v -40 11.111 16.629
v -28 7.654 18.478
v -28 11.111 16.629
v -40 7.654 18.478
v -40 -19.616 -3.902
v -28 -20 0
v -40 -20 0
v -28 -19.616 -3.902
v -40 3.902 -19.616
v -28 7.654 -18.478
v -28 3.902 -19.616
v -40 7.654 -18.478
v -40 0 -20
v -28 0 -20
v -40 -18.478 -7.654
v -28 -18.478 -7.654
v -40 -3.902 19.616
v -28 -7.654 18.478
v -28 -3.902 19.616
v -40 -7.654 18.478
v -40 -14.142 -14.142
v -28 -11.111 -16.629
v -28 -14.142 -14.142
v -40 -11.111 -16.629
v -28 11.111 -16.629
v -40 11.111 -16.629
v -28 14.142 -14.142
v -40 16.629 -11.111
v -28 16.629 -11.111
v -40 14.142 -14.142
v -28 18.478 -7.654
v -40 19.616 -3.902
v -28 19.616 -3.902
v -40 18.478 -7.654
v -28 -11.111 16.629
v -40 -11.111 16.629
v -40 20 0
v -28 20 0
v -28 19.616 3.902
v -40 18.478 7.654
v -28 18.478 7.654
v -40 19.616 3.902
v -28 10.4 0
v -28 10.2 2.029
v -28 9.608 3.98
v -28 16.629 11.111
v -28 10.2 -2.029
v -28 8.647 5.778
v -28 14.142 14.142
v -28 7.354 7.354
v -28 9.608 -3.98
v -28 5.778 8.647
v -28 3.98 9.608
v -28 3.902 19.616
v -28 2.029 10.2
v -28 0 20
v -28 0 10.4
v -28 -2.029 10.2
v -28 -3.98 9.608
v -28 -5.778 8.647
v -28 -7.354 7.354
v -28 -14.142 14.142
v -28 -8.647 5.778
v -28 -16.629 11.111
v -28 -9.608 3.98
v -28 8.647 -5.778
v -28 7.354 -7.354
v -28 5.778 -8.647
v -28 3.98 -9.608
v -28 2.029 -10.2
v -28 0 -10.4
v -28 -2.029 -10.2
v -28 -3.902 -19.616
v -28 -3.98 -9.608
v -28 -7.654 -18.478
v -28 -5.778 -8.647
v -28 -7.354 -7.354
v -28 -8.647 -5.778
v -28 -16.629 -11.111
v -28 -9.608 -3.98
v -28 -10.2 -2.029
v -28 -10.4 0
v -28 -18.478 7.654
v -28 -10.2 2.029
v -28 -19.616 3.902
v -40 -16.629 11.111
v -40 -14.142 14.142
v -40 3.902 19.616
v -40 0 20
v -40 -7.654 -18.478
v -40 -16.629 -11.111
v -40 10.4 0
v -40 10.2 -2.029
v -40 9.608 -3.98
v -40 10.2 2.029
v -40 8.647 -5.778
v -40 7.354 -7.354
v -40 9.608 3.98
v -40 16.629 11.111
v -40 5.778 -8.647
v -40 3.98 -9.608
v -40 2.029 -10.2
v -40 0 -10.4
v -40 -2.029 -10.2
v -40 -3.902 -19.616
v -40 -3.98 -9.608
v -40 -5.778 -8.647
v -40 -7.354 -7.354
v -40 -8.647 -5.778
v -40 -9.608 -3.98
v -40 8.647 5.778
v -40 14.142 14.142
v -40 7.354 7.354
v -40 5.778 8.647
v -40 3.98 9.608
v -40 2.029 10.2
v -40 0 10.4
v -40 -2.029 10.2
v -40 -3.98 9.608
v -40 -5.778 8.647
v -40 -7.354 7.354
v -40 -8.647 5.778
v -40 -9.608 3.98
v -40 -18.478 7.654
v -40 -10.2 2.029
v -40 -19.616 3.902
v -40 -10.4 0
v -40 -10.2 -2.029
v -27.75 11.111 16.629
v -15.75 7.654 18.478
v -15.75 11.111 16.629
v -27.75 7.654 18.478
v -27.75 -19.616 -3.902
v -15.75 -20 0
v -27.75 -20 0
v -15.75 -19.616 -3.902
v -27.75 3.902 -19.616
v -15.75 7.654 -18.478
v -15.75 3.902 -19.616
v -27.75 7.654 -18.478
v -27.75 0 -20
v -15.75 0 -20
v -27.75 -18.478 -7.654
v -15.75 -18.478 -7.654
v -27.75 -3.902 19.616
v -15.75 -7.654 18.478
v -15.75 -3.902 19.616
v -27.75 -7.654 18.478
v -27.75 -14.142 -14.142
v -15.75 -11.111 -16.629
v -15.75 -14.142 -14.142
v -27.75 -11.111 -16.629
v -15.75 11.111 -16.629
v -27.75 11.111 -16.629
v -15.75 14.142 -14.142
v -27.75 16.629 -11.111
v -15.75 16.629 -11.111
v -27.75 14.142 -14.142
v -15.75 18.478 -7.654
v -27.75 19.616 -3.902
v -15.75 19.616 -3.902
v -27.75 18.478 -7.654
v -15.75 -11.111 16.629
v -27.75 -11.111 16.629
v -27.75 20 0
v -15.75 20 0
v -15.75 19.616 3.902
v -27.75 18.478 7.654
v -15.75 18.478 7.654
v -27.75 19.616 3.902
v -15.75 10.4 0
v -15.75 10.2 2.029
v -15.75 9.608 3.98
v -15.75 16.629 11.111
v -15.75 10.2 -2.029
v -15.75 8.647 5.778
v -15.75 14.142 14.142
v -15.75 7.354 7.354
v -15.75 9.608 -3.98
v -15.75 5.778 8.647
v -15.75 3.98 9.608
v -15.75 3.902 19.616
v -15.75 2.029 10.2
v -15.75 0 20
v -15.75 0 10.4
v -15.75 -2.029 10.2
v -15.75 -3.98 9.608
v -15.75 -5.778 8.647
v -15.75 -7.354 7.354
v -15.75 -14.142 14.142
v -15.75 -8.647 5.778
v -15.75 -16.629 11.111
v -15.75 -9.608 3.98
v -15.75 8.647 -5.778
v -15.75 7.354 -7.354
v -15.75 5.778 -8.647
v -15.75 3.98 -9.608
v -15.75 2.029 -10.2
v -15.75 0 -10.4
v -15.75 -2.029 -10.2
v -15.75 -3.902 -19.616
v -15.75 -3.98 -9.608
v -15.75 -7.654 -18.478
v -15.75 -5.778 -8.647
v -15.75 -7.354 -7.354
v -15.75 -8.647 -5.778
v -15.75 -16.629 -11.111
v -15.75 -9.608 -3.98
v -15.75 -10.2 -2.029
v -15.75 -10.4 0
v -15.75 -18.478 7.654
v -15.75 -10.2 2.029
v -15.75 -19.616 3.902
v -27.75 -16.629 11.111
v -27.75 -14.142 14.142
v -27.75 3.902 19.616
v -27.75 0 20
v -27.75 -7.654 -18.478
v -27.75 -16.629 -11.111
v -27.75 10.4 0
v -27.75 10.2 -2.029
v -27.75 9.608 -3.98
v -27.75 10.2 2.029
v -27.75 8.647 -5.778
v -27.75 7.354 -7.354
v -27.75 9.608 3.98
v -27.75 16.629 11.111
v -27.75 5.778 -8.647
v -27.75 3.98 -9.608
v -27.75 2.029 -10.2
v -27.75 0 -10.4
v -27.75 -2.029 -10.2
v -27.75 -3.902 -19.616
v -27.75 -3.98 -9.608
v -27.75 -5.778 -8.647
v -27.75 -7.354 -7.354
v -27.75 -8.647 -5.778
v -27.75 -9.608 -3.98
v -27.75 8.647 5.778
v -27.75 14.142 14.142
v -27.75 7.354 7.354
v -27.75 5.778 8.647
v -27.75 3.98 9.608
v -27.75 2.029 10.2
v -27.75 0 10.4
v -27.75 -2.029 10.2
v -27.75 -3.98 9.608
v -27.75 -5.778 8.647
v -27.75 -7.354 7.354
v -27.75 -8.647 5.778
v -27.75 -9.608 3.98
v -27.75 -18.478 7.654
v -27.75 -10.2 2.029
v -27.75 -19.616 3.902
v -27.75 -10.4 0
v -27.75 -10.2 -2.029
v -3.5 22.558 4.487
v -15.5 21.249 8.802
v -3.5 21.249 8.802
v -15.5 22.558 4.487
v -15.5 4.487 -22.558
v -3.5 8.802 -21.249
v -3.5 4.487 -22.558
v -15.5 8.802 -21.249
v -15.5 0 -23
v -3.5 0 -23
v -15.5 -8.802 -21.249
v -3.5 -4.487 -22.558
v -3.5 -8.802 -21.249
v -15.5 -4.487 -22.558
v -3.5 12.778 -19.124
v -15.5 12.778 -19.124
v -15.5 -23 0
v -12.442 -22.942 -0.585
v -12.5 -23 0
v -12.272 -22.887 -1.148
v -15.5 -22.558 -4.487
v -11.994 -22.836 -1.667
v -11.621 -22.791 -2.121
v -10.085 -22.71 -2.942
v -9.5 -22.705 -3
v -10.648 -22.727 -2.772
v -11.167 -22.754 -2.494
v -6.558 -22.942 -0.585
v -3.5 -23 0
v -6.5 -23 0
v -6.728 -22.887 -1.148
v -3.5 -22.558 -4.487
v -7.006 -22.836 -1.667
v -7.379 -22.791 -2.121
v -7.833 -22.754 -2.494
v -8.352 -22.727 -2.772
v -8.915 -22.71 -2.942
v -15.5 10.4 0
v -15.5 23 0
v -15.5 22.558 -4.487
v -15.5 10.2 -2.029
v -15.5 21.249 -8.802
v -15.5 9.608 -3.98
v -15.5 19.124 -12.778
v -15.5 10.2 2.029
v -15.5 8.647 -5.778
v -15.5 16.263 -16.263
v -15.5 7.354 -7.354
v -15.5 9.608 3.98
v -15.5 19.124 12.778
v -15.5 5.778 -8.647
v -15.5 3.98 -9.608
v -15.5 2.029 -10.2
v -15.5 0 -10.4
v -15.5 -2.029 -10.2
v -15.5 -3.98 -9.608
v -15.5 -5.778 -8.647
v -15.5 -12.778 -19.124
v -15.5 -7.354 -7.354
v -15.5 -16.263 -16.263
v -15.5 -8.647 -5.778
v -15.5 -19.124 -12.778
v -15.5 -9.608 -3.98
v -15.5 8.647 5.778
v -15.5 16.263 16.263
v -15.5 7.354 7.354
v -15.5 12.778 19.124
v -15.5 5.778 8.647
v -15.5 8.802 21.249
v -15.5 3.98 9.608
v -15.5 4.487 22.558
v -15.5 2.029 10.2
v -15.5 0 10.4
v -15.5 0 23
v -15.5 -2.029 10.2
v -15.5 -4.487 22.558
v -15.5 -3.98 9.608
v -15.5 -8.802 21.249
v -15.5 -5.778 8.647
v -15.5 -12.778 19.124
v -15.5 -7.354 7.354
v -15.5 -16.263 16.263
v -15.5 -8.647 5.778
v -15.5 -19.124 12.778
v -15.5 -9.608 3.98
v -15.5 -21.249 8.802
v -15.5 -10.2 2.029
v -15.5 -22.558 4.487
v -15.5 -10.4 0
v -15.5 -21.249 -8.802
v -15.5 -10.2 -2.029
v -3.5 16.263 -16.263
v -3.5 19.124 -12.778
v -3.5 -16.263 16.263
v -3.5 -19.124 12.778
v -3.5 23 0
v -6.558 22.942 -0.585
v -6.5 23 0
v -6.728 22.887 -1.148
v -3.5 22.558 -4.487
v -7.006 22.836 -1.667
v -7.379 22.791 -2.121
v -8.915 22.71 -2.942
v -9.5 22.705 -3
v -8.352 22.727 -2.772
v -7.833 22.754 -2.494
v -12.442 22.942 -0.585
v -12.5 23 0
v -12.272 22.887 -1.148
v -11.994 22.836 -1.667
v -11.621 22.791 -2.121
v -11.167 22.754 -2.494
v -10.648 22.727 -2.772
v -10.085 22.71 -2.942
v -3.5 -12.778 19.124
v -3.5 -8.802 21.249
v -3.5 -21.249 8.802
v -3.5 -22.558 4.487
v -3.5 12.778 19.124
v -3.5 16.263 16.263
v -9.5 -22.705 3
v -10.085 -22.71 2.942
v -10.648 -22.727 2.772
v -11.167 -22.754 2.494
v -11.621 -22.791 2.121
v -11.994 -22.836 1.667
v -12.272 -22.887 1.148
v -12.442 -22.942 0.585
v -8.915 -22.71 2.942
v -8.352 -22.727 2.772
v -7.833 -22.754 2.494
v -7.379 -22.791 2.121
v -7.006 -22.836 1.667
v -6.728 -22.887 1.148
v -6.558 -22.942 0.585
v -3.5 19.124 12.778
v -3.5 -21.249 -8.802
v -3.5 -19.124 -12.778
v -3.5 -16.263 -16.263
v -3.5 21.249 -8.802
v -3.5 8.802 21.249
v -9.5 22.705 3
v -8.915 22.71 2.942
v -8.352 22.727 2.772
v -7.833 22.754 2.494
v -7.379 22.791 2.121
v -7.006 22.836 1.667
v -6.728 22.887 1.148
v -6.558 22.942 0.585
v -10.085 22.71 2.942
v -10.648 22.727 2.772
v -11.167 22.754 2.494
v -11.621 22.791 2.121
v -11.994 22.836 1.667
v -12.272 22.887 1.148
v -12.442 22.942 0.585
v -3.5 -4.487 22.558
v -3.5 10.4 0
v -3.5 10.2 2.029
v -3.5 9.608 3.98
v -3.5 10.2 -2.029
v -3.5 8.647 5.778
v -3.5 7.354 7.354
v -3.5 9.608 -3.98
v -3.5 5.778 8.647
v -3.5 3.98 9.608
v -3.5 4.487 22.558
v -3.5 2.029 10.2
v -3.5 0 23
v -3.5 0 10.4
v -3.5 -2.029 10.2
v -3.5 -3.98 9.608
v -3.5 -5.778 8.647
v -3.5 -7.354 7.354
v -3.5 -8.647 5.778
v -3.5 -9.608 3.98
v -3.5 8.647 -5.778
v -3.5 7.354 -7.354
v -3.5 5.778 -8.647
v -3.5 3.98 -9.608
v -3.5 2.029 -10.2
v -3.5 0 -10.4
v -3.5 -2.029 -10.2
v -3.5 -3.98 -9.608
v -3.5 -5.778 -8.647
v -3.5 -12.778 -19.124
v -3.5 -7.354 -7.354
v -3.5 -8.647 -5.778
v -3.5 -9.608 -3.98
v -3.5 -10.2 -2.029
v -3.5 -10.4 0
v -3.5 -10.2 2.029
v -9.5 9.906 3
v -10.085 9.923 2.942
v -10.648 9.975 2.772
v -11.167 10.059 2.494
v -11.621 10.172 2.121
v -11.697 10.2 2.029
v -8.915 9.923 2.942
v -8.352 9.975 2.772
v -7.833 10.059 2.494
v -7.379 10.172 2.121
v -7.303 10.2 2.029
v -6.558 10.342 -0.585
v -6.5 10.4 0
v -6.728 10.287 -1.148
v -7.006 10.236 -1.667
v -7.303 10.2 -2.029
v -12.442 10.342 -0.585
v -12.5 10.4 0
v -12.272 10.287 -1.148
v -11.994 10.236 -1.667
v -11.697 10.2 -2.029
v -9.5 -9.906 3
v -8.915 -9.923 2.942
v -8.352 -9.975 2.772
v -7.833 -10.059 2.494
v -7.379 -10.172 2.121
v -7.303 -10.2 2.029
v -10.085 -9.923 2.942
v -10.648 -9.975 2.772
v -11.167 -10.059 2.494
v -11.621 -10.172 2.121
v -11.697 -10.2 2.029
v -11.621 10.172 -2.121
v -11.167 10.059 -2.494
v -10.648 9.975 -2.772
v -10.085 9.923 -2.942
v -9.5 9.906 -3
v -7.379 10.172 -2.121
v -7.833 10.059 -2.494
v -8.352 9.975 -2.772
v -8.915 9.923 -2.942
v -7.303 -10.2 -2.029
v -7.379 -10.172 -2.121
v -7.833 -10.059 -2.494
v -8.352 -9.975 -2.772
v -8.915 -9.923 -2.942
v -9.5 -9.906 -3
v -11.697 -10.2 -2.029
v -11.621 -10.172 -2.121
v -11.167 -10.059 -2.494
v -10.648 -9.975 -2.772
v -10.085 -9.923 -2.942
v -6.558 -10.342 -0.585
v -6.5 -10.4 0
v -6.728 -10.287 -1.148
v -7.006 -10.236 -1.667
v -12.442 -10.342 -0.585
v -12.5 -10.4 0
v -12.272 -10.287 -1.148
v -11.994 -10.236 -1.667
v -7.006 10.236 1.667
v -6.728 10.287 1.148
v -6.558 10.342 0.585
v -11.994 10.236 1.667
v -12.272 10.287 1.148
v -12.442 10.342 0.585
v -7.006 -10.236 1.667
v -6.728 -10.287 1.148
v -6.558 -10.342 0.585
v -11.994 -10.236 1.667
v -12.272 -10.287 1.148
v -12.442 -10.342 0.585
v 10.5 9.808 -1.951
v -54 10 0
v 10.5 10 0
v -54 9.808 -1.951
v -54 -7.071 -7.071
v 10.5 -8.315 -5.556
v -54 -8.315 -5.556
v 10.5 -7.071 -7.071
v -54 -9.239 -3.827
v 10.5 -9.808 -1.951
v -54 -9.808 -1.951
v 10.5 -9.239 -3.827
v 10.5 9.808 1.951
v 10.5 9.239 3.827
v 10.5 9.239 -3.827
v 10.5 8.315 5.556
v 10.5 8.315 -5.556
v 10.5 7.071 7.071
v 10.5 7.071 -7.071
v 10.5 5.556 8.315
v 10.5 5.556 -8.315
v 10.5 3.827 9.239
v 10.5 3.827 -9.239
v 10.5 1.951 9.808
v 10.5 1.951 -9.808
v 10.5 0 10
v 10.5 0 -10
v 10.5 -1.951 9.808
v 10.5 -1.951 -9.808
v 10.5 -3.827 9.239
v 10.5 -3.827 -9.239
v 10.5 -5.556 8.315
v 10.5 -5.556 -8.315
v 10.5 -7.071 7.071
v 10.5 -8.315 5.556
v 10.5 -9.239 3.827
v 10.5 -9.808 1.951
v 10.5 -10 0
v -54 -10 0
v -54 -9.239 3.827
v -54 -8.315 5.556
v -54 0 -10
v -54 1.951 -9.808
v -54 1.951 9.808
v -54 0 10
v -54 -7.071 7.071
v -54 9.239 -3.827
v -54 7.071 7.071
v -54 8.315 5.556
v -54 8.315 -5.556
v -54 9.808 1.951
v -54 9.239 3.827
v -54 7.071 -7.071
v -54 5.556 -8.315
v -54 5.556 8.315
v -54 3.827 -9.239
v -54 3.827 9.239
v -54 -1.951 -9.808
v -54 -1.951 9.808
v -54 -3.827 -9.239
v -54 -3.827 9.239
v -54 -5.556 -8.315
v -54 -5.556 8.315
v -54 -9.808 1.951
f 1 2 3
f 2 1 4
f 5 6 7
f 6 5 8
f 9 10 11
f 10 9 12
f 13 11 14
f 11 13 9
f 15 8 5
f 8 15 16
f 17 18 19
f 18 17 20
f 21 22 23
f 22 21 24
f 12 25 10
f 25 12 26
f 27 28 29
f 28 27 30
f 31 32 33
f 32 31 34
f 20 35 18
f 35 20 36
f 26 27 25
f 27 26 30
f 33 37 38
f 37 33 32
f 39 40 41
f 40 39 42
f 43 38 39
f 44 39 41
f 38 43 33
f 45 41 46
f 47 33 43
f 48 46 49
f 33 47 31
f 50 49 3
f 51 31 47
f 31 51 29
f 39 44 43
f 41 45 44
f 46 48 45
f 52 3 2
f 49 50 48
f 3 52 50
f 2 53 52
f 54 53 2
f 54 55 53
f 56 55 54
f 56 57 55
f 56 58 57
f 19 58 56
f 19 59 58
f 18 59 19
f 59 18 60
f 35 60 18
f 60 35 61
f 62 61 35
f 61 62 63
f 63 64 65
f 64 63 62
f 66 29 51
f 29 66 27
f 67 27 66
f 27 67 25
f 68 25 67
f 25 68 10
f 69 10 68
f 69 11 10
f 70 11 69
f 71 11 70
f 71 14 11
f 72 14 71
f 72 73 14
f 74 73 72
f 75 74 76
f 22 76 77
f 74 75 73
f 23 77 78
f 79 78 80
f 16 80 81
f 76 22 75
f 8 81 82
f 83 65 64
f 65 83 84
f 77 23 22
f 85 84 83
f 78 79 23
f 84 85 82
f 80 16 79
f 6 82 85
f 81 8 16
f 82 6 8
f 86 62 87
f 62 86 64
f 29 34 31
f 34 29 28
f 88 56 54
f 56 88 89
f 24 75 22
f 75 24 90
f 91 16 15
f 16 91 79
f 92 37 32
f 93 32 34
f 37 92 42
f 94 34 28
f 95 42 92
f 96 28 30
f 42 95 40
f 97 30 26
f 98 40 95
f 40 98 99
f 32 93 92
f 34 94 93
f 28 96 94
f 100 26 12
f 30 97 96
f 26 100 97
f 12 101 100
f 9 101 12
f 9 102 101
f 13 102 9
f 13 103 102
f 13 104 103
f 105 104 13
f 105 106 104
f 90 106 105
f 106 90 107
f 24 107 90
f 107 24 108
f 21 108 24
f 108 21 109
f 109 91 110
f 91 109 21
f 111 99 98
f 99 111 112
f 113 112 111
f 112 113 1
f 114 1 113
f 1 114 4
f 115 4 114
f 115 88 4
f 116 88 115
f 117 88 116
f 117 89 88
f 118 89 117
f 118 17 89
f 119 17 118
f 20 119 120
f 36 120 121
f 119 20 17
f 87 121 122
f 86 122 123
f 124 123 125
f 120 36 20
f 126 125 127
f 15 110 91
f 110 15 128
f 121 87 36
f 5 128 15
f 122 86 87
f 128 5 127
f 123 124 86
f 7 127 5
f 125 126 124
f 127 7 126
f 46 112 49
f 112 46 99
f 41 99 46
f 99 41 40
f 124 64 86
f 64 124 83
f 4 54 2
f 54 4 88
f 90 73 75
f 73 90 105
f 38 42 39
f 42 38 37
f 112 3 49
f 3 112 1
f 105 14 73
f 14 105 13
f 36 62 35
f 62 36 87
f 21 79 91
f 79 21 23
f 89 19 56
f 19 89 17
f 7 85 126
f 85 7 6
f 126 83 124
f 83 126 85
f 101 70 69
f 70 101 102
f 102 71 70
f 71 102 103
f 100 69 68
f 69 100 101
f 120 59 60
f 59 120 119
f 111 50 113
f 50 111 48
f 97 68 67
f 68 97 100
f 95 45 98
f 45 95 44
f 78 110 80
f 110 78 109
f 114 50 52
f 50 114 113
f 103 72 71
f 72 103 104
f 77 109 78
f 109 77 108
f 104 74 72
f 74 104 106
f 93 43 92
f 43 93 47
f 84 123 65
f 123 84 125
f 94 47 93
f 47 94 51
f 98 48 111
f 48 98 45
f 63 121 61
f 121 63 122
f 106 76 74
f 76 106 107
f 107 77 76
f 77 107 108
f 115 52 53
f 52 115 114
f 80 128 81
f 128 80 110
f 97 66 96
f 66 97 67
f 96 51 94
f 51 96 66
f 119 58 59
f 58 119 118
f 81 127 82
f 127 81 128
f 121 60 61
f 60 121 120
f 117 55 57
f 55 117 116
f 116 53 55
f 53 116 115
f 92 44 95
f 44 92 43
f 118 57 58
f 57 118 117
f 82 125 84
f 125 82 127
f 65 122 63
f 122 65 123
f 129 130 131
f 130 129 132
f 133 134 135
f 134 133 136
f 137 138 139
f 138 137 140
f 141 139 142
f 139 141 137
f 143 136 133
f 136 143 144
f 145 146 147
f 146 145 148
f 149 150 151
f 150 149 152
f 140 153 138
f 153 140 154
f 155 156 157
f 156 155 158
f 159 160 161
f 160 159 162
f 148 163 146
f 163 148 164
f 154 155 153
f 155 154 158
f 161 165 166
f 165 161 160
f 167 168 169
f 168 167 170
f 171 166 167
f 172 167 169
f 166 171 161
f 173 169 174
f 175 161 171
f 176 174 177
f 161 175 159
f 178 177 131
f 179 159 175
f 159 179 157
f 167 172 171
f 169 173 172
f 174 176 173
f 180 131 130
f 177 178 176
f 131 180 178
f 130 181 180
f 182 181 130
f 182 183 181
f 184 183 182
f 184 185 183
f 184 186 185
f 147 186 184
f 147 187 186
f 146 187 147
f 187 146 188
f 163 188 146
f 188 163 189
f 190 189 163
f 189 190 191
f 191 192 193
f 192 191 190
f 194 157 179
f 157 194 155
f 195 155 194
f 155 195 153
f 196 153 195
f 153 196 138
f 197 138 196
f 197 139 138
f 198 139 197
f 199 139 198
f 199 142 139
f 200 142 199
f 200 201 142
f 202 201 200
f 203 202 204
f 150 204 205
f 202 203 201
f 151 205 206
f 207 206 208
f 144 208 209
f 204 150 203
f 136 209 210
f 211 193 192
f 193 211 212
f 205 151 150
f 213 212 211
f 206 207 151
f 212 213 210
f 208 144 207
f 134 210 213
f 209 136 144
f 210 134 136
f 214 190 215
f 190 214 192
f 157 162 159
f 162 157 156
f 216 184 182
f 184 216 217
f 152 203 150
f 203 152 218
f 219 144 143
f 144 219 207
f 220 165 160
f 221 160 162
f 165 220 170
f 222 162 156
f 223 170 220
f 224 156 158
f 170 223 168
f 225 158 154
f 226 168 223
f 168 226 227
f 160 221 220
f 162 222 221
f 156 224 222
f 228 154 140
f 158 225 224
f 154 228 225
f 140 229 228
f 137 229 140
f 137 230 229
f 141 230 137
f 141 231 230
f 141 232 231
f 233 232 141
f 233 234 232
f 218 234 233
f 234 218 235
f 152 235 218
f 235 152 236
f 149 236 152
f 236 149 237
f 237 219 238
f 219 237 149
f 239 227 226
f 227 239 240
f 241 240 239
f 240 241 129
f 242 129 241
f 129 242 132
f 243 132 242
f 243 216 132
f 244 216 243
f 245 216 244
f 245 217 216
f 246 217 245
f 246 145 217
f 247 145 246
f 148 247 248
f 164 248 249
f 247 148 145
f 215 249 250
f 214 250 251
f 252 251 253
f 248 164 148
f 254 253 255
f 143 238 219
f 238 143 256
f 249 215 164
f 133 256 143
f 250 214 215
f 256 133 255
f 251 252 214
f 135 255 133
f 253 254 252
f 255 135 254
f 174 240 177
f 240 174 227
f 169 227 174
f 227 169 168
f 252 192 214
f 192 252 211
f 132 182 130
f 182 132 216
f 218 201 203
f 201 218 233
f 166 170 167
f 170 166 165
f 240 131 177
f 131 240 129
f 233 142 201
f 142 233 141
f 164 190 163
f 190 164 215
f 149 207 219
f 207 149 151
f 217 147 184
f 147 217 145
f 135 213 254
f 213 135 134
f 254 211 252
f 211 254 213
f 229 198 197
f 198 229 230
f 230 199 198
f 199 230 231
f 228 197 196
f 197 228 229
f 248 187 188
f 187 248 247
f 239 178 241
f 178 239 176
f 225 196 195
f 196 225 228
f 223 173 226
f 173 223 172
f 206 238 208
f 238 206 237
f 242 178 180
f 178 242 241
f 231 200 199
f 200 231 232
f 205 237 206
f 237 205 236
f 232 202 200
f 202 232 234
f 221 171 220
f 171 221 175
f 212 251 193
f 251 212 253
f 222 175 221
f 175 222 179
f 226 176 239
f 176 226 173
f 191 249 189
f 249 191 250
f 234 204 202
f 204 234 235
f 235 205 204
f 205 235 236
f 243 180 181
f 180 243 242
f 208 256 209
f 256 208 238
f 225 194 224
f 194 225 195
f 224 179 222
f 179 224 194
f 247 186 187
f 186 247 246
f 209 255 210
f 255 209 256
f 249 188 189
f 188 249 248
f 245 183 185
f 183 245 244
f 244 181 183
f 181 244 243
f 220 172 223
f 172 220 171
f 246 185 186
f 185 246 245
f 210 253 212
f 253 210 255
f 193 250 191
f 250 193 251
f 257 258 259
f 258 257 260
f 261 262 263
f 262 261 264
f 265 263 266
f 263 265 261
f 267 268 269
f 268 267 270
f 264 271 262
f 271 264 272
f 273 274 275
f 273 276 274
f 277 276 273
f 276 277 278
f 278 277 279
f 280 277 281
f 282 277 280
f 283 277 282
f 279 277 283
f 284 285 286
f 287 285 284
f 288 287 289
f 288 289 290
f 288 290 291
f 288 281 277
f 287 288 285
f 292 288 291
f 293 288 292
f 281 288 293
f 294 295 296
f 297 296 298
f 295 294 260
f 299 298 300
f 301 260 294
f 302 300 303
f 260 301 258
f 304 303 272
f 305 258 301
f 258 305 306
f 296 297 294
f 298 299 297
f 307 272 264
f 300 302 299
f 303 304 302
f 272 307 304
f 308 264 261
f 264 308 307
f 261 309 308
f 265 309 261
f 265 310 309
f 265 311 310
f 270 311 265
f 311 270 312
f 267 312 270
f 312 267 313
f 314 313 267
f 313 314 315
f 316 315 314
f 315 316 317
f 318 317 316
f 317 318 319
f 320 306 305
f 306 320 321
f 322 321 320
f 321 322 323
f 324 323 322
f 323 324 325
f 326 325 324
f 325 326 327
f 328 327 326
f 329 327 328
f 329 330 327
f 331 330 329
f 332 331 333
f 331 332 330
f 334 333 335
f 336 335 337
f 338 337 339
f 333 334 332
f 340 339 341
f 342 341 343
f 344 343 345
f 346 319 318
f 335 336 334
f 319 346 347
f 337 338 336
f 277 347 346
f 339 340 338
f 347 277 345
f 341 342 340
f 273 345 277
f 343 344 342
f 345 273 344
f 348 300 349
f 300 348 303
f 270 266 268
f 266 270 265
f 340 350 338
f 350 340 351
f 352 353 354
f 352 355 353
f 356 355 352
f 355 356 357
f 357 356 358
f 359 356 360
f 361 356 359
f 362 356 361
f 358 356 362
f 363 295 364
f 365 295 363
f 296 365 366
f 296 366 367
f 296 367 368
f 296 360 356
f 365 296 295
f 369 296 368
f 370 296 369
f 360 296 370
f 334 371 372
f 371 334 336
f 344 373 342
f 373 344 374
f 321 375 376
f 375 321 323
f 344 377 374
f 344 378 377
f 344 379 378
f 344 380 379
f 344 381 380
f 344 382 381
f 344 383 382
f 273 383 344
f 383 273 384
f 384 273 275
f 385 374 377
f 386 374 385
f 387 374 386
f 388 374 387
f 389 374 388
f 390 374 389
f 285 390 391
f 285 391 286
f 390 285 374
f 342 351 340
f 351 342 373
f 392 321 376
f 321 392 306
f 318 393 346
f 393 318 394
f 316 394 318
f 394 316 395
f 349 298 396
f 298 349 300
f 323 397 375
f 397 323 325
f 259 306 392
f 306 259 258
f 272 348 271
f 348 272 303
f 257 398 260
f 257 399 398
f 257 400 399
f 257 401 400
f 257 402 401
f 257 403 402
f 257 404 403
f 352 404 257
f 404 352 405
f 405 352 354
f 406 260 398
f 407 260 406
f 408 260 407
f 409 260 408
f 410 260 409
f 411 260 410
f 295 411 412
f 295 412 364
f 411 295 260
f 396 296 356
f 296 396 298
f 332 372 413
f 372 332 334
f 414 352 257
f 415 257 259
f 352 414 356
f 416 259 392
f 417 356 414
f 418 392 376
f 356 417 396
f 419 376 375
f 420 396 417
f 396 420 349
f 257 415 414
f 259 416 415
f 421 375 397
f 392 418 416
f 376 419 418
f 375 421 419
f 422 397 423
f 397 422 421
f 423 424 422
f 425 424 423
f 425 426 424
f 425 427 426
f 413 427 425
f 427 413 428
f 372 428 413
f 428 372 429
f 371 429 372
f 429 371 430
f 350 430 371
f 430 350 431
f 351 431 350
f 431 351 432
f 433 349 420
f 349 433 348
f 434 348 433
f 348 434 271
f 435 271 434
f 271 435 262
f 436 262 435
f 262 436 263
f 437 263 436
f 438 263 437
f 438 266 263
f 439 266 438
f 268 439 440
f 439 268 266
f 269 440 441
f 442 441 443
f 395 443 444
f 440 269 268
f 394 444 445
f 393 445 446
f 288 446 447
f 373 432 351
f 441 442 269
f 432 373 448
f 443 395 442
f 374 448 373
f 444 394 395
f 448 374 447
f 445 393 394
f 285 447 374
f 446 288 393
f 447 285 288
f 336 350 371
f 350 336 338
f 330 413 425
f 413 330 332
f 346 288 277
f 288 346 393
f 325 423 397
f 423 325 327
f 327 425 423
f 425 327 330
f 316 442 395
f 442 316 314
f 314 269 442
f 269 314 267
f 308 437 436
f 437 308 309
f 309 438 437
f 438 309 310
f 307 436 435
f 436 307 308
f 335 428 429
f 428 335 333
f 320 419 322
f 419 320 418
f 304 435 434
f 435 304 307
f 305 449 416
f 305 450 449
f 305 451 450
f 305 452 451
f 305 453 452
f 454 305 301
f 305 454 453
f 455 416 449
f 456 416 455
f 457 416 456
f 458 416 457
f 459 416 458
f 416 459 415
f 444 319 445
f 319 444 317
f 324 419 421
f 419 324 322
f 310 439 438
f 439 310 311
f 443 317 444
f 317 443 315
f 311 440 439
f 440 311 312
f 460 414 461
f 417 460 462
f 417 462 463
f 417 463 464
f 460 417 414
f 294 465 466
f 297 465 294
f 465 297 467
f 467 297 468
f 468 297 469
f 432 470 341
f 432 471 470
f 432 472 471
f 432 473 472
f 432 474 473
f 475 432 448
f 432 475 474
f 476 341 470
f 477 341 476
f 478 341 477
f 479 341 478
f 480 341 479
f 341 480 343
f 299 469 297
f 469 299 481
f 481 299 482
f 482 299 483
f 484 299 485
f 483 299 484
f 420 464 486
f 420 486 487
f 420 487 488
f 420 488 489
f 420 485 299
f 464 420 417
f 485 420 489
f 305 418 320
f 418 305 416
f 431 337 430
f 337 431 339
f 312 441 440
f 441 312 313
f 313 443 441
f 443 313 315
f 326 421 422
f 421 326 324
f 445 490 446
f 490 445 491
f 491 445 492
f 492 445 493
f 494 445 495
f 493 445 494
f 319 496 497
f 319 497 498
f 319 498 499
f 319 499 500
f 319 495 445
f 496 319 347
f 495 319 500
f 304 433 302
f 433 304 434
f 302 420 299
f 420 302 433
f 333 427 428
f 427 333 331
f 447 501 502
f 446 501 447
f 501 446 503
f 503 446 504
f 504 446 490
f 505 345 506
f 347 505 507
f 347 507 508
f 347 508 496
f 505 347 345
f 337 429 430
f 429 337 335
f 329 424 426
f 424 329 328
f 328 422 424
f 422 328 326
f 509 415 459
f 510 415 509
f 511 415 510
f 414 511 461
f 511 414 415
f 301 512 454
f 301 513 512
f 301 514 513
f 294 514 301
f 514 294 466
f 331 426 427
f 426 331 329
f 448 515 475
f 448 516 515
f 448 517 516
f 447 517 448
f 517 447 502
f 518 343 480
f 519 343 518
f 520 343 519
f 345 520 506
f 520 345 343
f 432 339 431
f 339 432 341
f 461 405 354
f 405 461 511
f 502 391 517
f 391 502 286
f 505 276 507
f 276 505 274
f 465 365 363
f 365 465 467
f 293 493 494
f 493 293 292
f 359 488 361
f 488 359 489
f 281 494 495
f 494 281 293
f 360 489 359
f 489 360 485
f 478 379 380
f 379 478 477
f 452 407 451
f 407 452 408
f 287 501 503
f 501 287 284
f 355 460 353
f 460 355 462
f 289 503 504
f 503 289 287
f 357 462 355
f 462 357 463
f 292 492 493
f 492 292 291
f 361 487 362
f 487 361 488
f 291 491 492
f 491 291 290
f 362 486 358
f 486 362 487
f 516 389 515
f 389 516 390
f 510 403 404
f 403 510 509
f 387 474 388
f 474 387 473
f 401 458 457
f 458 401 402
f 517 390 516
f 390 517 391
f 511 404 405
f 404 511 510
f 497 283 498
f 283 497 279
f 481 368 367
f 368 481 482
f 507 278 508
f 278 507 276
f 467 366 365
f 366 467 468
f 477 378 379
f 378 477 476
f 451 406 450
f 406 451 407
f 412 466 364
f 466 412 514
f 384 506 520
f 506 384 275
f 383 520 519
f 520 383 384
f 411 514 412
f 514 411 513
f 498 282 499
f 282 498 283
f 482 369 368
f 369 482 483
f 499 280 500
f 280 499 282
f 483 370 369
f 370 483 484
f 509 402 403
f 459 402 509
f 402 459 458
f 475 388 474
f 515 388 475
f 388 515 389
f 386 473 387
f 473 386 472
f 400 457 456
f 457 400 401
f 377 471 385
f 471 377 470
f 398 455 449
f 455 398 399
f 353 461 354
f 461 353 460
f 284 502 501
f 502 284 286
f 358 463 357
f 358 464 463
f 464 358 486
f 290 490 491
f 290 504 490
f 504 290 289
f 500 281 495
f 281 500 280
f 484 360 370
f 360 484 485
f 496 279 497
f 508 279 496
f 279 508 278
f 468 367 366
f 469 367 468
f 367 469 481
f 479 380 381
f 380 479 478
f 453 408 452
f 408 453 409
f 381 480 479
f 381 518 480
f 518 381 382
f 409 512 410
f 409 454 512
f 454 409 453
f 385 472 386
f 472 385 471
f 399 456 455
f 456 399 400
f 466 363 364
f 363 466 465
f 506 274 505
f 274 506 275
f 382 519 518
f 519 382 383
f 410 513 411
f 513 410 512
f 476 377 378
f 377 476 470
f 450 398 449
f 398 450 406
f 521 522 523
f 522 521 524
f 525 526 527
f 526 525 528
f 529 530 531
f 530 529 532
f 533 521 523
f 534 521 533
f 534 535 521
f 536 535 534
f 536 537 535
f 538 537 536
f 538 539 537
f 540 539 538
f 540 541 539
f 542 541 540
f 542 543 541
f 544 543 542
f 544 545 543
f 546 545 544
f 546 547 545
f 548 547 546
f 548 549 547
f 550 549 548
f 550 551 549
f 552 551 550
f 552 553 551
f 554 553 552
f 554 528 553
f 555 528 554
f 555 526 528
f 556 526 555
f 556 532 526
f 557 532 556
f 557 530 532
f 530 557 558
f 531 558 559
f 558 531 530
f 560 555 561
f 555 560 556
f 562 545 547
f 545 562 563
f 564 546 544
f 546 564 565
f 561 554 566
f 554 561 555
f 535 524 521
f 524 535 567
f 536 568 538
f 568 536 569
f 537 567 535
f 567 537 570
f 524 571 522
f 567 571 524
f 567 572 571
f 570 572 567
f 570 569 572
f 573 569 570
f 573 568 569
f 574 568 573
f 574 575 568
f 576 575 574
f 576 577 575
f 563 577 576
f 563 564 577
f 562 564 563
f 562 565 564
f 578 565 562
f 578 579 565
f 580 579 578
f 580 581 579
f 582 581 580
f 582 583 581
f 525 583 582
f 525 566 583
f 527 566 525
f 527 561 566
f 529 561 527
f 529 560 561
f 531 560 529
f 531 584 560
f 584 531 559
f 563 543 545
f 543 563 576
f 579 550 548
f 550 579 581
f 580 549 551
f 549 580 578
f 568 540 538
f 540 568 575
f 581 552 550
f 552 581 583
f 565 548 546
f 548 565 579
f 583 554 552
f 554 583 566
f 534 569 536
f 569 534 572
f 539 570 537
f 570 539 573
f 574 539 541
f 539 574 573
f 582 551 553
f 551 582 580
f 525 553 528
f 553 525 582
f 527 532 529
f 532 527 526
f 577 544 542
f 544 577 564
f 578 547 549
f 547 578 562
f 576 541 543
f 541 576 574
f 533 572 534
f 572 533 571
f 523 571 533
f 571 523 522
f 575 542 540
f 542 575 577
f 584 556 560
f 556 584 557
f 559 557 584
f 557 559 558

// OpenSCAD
$fn = 32;

// ------------------------------------------------------------------------
// Shaft with rings and collars: d20 shaft, 3 rings
// Every part is its own module, assembly() places them once.
// ------------------------------------------------------------------------

// --- part 1 ---
module shaft() {
  translate([0, 0, -32.25]) cylinder(h = 64.5, d = 20);
}

// --- part 2 ---
module spacer_a() {
  difference() {
      translate([0, 0, 0]) cylinder(h = 12, d = 40);
      translate([0, 0, -1]) cylinder(h = 14, d = 20.8);
    }
}

// --- part 3 ---
module spacer_b() {
  difference() {
      translate([0, 0, 0]) cylinder(h = 12, d = 40);
      translate([0, 0, -1]) cylinder(h = 14, d = 20.8);
    }
}

// --- part 4 ---
module collar_a() {
  difference() {
    cylinder(h = 12, d = 46);
    translate([0, 0, -1]) cylinder(h = 14, d = 20.8);
    translate([0, 0, 6]) rotate([90, 0, 0]) cylinder(h = 48, d = 6, center = true);
  }
}

// --- assembly ---
module assembly() {
  translate([-21.75, 0, 0]) rotate([0, 90, 0]) shaft();
  translate([-40, 0, 0]) rotate([0, 90, 0]) spacer_a();
  translate([-27.75, 0, 0]) rotate([0, 90, 0]) spacer_b();
  translate([-15.5, 0, 0]) rotate([0, 90, 0]) collar_a();
}

assembly();
